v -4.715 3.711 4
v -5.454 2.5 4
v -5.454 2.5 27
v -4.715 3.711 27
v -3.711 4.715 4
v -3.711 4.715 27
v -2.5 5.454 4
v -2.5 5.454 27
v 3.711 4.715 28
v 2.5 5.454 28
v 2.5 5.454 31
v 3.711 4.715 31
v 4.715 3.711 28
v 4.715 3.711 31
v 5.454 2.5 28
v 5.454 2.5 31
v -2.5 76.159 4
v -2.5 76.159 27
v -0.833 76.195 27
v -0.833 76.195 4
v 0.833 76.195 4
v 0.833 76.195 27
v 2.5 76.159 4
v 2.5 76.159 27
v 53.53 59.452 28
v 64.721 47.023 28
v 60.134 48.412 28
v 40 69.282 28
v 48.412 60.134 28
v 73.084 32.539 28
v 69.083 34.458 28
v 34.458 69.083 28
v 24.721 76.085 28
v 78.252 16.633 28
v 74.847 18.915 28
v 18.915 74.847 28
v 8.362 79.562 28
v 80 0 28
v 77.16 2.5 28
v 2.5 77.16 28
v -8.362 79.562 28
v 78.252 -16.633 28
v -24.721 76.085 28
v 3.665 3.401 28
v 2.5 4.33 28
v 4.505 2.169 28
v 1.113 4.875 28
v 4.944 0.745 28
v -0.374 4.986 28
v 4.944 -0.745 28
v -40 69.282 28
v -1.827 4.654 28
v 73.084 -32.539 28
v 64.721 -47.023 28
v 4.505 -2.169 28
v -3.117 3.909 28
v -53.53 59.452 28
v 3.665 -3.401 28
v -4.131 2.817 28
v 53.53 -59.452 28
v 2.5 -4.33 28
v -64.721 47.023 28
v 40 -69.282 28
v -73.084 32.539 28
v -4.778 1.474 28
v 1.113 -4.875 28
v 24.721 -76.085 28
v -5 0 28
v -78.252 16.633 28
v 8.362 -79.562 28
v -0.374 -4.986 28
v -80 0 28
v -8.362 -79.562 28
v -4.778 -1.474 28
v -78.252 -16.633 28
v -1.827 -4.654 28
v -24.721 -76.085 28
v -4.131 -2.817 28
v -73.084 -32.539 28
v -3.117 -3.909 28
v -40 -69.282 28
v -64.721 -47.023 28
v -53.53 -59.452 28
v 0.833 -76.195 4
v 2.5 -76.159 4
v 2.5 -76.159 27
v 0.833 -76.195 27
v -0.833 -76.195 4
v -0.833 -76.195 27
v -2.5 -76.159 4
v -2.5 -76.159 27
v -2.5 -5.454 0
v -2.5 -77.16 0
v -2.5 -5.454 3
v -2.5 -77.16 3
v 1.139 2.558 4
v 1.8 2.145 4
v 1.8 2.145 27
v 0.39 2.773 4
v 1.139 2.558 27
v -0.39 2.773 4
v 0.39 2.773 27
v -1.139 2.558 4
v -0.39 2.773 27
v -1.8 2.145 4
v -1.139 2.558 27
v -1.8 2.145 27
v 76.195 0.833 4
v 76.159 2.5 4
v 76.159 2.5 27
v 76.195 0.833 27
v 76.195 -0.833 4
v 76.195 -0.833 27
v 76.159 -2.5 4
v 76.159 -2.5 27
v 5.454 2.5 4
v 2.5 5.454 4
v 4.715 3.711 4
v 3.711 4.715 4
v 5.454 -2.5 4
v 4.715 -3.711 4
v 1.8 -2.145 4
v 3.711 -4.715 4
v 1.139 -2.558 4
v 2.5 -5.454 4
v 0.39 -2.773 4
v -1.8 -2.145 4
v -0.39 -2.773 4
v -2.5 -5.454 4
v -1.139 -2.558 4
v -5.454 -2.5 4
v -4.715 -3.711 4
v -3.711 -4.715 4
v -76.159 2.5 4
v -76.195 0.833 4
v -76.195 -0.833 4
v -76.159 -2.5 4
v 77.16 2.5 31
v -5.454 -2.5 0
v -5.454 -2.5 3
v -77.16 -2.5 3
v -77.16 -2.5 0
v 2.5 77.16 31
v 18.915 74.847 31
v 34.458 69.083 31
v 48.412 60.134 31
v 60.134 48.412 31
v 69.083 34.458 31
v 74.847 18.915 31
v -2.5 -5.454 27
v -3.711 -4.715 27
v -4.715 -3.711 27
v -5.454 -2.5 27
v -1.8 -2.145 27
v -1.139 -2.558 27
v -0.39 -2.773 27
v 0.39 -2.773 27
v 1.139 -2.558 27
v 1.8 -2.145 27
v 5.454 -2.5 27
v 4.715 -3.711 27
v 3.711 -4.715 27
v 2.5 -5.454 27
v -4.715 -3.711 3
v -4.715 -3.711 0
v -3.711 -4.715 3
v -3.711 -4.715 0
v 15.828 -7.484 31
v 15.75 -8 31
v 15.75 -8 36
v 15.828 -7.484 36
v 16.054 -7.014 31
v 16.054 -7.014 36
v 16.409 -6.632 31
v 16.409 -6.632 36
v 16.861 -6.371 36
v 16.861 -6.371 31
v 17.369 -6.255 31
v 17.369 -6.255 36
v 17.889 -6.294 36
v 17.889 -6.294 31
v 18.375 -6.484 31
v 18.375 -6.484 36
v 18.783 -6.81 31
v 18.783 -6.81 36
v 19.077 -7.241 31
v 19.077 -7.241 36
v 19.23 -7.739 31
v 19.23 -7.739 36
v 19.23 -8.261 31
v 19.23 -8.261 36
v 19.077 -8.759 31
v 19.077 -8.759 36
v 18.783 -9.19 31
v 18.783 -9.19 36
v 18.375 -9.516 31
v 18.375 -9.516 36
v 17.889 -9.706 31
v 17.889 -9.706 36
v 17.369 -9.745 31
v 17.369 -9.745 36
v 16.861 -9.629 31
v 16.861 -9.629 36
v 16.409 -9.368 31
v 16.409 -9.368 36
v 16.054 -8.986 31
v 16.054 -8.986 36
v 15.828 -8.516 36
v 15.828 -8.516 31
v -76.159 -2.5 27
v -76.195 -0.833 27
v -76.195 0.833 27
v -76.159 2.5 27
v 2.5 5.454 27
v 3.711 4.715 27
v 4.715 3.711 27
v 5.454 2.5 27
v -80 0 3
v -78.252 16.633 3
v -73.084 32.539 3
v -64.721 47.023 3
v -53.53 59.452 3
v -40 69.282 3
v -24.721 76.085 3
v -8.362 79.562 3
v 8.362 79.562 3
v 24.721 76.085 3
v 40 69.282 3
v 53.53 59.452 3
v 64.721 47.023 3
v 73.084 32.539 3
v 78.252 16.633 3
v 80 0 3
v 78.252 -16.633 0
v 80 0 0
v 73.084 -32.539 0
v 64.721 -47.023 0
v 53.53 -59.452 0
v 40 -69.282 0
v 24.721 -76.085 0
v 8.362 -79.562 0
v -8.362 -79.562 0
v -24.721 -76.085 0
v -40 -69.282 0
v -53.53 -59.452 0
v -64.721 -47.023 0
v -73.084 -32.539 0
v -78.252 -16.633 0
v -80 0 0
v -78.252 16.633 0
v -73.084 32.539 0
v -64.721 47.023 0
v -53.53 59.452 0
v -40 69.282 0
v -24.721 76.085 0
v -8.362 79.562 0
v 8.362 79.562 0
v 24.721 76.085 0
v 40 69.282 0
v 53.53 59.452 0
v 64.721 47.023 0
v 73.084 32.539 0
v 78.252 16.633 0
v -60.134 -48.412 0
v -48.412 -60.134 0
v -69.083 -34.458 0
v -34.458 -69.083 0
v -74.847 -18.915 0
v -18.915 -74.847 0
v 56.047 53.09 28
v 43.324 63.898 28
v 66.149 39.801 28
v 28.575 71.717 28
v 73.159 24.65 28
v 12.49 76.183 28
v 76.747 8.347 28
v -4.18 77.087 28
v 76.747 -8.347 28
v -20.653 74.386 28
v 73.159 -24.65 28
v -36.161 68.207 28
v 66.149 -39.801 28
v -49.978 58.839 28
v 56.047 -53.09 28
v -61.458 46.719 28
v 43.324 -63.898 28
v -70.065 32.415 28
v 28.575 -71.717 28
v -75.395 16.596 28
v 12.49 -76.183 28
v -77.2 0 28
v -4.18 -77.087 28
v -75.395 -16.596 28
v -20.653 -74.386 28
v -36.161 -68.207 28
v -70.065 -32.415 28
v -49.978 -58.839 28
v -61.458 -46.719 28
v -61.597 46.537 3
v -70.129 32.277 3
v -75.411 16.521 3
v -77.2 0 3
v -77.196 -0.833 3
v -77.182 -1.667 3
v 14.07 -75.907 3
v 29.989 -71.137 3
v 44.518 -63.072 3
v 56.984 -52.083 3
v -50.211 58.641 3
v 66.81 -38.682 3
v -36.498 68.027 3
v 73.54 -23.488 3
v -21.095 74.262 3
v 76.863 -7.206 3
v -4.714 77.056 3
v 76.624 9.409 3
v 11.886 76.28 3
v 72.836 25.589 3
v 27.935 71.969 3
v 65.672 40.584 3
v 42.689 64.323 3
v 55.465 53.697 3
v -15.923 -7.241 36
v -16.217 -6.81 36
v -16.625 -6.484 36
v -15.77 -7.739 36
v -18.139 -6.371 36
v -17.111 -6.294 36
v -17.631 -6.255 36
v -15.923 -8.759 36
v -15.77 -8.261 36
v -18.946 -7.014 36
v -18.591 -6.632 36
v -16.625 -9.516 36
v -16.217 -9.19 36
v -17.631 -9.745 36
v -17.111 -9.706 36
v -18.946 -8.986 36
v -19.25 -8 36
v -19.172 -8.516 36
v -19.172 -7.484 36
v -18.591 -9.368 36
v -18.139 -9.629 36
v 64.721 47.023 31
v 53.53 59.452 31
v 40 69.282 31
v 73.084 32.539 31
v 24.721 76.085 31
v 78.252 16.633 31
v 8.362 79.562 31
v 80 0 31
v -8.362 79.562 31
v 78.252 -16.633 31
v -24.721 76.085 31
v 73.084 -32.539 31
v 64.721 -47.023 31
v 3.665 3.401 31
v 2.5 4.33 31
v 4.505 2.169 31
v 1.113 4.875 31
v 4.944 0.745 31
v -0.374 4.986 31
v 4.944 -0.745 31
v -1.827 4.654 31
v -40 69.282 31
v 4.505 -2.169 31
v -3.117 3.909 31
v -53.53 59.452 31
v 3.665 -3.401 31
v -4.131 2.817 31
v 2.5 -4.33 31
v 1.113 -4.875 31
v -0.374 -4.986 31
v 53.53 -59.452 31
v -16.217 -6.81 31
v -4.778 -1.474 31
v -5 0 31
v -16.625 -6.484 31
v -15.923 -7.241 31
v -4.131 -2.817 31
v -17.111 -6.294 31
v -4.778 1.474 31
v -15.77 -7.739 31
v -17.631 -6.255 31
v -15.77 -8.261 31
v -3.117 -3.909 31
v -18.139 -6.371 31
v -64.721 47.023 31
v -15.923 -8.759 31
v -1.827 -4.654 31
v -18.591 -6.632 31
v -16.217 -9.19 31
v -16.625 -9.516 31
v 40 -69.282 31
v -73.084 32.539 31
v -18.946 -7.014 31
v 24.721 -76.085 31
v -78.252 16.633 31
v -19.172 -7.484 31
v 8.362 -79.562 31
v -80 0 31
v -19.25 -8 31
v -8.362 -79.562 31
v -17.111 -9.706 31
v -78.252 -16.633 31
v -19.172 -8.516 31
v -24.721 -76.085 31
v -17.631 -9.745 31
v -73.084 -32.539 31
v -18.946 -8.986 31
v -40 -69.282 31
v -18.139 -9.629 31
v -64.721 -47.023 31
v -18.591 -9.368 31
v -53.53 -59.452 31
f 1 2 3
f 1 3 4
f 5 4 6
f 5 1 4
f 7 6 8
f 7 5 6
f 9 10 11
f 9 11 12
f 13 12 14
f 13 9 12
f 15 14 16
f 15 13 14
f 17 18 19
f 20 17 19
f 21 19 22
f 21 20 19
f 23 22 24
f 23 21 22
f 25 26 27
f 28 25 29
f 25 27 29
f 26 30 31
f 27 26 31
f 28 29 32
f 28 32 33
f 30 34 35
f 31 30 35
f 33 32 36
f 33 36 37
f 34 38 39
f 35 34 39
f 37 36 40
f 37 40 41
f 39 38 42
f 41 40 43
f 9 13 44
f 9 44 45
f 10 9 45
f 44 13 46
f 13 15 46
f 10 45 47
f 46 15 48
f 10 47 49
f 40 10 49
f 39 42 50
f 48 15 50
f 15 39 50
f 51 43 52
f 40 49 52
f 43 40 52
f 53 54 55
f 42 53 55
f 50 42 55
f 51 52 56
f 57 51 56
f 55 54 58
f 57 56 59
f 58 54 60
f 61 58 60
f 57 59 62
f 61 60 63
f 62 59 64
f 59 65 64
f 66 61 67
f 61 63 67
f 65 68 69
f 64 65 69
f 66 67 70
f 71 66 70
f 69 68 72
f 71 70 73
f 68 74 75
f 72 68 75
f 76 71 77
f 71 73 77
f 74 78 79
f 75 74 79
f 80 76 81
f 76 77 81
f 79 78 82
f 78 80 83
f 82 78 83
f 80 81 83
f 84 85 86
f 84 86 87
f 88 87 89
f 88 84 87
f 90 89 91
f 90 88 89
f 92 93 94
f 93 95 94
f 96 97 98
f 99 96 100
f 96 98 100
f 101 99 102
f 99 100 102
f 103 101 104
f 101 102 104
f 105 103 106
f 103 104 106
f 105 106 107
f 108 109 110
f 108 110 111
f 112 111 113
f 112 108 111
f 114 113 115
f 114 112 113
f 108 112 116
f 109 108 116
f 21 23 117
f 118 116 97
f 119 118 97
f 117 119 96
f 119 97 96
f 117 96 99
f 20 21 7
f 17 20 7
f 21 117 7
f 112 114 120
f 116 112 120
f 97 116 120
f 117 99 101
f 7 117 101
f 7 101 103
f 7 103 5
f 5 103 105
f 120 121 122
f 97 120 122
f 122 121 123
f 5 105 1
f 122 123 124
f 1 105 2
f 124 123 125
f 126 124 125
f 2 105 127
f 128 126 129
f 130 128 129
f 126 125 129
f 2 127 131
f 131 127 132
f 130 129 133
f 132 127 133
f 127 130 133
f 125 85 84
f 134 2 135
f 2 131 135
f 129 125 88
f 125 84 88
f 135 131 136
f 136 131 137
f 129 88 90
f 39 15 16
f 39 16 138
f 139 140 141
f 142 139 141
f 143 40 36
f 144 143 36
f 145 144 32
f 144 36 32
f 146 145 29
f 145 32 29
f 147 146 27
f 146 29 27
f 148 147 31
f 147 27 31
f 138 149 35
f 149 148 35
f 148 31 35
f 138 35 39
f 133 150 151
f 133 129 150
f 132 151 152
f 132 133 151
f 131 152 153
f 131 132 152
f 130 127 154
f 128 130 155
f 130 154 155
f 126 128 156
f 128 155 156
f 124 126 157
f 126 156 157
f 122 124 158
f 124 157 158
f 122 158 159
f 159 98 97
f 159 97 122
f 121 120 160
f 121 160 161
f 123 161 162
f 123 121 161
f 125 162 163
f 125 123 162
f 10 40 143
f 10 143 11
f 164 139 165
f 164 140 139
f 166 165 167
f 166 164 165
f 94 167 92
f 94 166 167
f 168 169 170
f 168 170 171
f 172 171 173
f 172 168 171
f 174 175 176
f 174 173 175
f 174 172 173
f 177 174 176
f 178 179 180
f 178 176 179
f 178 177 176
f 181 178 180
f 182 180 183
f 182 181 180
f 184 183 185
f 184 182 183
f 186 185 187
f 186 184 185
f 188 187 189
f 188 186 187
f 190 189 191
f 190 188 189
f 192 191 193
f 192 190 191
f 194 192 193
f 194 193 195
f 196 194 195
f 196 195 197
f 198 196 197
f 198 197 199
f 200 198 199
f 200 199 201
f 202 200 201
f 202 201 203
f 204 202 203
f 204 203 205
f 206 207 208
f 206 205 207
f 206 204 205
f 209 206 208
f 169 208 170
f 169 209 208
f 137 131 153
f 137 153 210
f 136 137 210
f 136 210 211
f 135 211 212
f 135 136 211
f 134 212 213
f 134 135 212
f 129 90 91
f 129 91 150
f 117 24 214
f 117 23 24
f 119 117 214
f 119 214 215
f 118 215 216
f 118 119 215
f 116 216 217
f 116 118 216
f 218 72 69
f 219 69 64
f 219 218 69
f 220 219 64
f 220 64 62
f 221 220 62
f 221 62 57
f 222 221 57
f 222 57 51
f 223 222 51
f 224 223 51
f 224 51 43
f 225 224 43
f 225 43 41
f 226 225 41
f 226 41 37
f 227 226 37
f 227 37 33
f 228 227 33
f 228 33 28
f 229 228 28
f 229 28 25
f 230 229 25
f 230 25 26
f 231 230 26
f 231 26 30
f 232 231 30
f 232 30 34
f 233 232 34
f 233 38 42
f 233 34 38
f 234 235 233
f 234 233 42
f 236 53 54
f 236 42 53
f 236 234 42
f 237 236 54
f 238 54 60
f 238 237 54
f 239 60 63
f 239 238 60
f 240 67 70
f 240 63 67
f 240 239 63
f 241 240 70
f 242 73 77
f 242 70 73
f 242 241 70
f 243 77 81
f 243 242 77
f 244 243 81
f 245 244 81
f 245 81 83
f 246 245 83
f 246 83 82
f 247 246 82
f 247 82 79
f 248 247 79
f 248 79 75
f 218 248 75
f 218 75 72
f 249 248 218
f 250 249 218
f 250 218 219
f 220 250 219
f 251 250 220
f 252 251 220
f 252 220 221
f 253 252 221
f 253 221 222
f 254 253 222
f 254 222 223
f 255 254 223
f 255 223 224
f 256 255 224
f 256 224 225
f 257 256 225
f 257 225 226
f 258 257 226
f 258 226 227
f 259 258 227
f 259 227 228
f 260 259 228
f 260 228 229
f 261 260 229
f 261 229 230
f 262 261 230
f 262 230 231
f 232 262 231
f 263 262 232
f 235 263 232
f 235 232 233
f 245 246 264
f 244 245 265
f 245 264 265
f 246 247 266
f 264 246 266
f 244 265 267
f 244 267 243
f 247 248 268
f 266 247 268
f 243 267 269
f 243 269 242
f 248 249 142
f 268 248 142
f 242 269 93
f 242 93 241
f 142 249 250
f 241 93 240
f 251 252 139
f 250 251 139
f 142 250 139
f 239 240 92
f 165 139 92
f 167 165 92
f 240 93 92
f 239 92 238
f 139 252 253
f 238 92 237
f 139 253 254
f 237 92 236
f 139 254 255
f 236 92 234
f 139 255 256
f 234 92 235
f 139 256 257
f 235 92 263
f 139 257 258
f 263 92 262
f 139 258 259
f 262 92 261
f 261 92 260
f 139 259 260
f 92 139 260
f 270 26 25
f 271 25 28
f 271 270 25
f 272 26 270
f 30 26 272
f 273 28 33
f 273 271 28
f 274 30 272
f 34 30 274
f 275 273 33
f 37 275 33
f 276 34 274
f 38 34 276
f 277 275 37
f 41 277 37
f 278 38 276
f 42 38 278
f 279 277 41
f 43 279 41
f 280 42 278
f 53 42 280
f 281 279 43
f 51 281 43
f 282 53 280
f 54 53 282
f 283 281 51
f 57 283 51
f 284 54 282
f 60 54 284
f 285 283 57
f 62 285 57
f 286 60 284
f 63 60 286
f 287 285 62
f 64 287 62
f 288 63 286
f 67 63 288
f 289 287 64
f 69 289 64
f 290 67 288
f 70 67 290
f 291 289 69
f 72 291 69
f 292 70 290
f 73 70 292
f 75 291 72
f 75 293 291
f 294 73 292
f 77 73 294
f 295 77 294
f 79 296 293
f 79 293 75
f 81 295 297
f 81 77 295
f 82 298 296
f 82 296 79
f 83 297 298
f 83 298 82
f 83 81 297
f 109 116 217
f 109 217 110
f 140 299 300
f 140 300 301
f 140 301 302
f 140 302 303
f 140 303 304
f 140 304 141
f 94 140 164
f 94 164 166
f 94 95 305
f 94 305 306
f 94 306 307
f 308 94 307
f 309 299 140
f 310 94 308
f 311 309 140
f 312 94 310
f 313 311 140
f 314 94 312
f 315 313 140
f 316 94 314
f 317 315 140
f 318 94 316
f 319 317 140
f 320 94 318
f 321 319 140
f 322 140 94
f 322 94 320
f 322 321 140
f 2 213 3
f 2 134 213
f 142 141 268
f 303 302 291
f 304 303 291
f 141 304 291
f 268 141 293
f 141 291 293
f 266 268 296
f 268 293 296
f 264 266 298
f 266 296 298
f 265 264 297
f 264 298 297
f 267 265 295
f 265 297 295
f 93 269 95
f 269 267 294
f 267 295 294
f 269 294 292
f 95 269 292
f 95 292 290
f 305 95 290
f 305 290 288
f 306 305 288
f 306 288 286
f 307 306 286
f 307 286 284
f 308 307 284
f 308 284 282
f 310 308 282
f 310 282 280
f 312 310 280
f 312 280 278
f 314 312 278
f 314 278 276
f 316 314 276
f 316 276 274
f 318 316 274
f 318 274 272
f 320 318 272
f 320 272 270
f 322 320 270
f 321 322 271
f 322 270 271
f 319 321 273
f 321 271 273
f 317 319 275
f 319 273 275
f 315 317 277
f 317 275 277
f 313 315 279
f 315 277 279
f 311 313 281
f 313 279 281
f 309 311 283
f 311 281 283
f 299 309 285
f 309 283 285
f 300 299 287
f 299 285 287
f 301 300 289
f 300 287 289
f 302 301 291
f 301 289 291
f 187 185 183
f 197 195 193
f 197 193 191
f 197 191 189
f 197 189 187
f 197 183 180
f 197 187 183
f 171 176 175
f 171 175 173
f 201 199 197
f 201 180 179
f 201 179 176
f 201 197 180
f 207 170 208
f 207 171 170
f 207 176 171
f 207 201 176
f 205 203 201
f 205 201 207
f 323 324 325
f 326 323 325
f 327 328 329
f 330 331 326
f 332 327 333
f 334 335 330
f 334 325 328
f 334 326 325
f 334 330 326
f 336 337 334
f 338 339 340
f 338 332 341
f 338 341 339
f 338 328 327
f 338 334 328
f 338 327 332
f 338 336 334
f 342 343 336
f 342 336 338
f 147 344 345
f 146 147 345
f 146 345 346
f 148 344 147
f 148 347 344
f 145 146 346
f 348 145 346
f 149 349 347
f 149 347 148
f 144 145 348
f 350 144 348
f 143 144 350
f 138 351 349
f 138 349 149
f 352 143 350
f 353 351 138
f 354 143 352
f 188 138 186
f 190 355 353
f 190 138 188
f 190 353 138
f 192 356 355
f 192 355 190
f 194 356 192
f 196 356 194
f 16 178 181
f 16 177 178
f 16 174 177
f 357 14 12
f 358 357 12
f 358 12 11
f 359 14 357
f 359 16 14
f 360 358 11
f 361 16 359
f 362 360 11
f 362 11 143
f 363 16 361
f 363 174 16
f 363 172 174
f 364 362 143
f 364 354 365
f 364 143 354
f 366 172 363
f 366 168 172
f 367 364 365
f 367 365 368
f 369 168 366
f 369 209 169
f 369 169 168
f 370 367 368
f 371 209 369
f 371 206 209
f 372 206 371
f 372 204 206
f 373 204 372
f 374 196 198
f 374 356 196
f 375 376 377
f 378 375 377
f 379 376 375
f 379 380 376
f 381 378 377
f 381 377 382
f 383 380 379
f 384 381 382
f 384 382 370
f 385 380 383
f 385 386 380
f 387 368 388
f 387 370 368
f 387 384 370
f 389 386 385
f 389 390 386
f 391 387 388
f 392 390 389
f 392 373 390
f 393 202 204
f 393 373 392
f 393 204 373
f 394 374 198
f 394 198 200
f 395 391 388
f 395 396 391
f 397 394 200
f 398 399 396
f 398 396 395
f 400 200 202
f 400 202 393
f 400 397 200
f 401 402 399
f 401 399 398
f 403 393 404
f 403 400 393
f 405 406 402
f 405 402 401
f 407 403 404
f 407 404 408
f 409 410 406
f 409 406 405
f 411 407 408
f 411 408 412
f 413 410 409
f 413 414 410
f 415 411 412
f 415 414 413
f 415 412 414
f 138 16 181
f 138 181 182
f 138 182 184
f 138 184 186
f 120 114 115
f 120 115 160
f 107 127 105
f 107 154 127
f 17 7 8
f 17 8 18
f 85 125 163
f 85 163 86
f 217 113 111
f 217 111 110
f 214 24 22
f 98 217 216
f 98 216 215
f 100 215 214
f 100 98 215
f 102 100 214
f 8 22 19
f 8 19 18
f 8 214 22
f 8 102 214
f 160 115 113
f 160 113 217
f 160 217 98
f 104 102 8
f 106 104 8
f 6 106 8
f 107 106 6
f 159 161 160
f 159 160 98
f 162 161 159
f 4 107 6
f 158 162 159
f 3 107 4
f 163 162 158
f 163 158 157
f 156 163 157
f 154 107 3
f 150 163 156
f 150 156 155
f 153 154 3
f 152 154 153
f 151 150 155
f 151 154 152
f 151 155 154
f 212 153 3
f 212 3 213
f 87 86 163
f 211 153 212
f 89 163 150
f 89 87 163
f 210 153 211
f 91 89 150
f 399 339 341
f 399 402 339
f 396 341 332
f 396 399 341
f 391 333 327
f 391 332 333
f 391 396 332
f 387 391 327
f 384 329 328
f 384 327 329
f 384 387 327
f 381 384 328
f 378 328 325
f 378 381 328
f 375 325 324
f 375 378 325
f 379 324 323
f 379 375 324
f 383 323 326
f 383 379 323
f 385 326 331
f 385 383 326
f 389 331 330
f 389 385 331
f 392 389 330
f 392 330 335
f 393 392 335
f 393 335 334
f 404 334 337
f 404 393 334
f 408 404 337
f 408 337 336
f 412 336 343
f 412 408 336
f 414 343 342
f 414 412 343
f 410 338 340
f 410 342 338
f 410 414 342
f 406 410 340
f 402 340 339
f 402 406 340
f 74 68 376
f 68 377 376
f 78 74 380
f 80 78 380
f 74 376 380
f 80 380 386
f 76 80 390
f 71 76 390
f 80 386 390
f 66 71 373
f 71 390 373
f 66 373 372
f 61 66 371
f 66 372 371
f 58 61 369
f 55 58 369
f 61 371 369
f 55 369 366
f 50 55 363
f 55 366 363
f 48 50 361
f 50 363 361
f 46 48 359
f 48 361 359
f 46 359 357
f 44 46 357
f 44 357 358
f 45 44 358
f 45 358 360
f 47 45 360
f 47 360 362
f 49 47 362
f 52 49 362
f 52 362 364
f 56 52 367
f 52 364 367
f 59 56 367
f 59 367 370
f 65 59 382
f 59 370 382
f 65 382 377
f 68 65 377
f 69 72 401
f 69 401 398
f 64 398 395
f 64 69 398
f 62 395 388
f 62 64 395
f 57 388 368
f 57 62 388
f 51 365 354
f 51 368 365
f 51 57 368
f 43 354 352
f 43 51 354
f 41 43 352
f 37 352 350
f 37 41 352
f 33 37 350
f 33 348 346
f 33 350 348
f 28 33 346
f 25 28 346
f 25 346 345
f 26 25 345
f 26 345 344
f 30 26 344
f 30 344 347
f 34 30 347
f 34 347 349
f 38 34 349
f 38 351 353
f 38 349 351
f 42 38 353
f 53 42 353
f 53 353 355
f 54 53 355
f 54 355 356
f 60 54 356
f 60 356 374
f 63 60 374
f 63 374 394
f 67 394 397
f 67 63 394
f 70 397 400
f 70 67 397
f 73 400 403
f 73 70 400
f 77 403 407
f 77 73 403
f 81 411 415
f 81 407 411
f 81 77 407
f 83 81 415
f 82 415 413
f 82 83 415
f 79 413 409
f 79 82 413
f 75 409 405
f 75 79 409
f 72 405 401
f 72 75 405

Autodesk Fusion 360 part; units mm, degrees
sketch "Floor" plane through (0, 0, 0) normal (0, 0, 1) x (1, 0, 0) in component "Container"
  circle A0 centre (0, 0) radius 80
  dimension "d25" = 160
extrude "Extrude1" add sketch "Floor" along normal blind 3 makes body 1 in component "Container"
sketch "Walls" plane through (0, 0, 3) normal (0, 0, 1) x (-1, 0, 0) in component "Container"
  circle A0 centre (0, 0) radius 80
  circle A1 centre (0, 0) radius 77.2
  dimension "d28" = -2.8
extrude "Extrude2" add sketch "Walls" along normal blind 25 bodies 1 in component "Container"
sketch "Swiper" plane through (0, 0, 3) normal (0, 0, 1) x (-1, 0, 0) in component "Container"
  circle A0 centre (0, 0) radius 77.2
  line L0 (-80, 2.5) -> (80, 2.5)
  line L1 (80, 2.5) -> (80, -2.5)
  line L2 (80, -2.5) -> (-80, -2.5)
  line L3 (-80, -2.5) -> (-80, 2.5)
  line L4 (-80, 2.5) -> (80, -2.5) construction
  line L5 (80, 2.5) -> (-80, -2.5) construction
  line L6 (-2.5, 80) -> (2.5, 80)
  line L7 (2.5, 80) -> (2.5, -80)
  line L8 (2.5, -80) -> (-2.5, -80)
  line L9 (-2.5, -80) -> (-2.5, 80)
  line L10 (-2.5, 80) -> (2.5, -80) construction
  line L11 (2.5, 80) -> (-2.5, -80) construction
  circle A1 centre (0, 0) radius 6
  circle A2 centre (0, 0) radius 76.2
  dimension "d31" = 160
  dimension "d32" = 5
  dimension "d33" = 5
  dimension "d34" = 160
  dimension "d35" = 12
  dimension "d41" = -1
extrude "Extrude3" cut sketch "Swiper" against normal through all contours A0 L0 L7 A2 | L0 L7 A1 A2 bodies 1 in component "Container"
extrude "Extrude1'" add sketch "Swiper" along normal blind 23 separate body contours L0 L2 A1 A2 | L7 L9 A1 A2 | L0 L2 L7 A1 | L0 L7 A1 | L7 L9 A1 A2 | L2 L7 A1 | L0 L7 L9 A1 | L0 L2 L7 L9 | L2 L7 L9 A1 | L0 L2 A1 A2 | L0 L9 A1 | L0 L2 L9 A1 | L2 L9 A1 makes body 2 in component "Swiper"
sketch "Sketch1" plane through (0, 0, 26) normal (0, 0, 1) x (-1, 0, 0) in component "Swiper"
  arc A0 (2.5, -5.4544) -> (5.4544, -2.5) centre (0, 0) ccw
  line L0 (5.4544, -2.5) -> (76.159, -2.5)
  arc A1 (76.159, -2.5) -> (76.159, 2.5) centre (0, 0) ccw
  line L1 (76.159, 2.5) -> (5.4544, 2.5)
  arc A2 (5.4544, 2.5) -> (2.5, 5.4544) centre (0, 0) ccw
  line L2 (2.5, 5.4544) -> (2.5, 76.159)
  arc A3 (2.5, 76.159) -> (-2.5, 76.159) centre (0, 0) ccw
  line L3 (-2.5, 76.159) -> (-2.5, 5.4544)
  arc A4 (-2.5, 5.4544) -> (-5.4544, 2.5) centre (0, 0) ccw
  line L4 (-5.4544, 2.5) -> (-76.159, 2.5)
  arc A5 (-76.159, 2.5) -> (-76.159, -2.5) centre (0, 0) ccw
  line L5 (-76.159, -2.5) -> (-5.4544, -2.5)
  arc A6 (-5.4544, -2.5) -> (-2.5, -5.4544) centre (0, 0) ccw
  line L6 (-2.5, -5.4544) -> (-2.5, -76.159)
  arc A7 (-2.5, -76.159) -> (2.5, -76.159) centre (0, 0) ccw
  line L7 (2.5, -76.159) -> (2.5, -5.4544)
  circle A8 centre (0, 0) radius 2.5
  line L8 (-1.5, 2.5) -> (1.5, 2.5)
  line L9 (1.5, 2.5) -> (1.5, -2.5)
  line L10 (1.5, -2.5) -> (-1.5, -2.5)
  line L11 (-1.5, -2.5) -> (-1.5, 2.5)
  line L12 (-1.5, 2.5) -> (1.5, -2.5) construction
  line L13 (1.5, 2.5) -> (-1.5, -2.5) construction
  circle A9 centre (0, 0) radius 2.8
  line L14 (-1.8, -2.8) -> (-1.8, 2.8)
  line L15 (-1.8, 2.8) -> (1.8, 2.8)
  line L16 (1.8, 2.8) -> (1.8, -2.8)
  line L17 (1.8, -2.8) -> (-1.8, -2.8)
  dimension "d44" = 5
  dimension "d45" = 3
  dimension "d46" = 5
  dimension "d54" = 0.3
  dimension "d55" = -0.3
extrude "Extrude3'" cut sketch "Sketch1" against normal up to surface (23 mm away) contours A8 L9 L16 | A8 L9 A9 L16 | A8 L9 A9 L16 | A8 L9 L11 | A8 L8 L9 A9 | A8 L9 L10 A9 | A8 L8 L11 A9 | L8 A9 | A8 L10 L11 A9 | L10 A9 | A8 L11 L14 | A8 L11 A9 L14 | A8 L11 A9 L14 bodies 2 in component "Swiper"
extrude "Extrude4" [suppressed] in component "Container"
extrude "Extrude1''" add 1 faces at (-53.0199, 6.1935, 0) along direction (0, 0, 1) blind 3 from surface at 28 separate body on bodies 1 makes body 3 in component "Lid"
sketch "Motor Mount" plane through (0, 0, 31) normal (0, 0, 1) x (1, 0, 0) in component "Lid"
  circle A0 centre (0, 0) radius 5
  line L0 (-17.5, 8) -> (17.5, 8) construction
  line L1 (17.5, 8) -> (17.5, -8) construction
  line L2 (17.5, -8) -> (-17.5, -8) construction
  line L3 (-17.5, -8) -> (-17.5, 8) construction
  line L4 (-17.5, 8) -> (17.5, -8) construction
  line L5 (17.5, 8) -> (-17.5, -8) construction
  circle A1 centre (17.5, 8) radius 1.75
  circle A2 centre (-17.5, 8) radius 1.75
  dimension "d58" = 10
  dimension "d62" = 35
  dimension "d63" = 16
  dimension "d64" = 3.5
  dimension "d65" = 3.5
extrude "Extrude3''" add sketch "Motor Mount" along normal blind 5 contours A1 | A2 bodies 3 in component "Lid"
extrude "Extrude2'" cut sketch "Motor Mount" against normal up to surface (3 mm away) contours A0 bodies 3 in component "Lid"
component "Container" placed x (1, 0, 0) y (0, 1, 0) z (0, 0, 1) at (0, 0, 0)
component "Swiper" placed x (1, 0, 0) y (0, 1, 0) z (0, 0, 1) at (0, 0, 1)
component "Lid" placed x (-1, 0, 0) y (0, -1, 0) z (0, 0, 1) at (0, 0, 0)
